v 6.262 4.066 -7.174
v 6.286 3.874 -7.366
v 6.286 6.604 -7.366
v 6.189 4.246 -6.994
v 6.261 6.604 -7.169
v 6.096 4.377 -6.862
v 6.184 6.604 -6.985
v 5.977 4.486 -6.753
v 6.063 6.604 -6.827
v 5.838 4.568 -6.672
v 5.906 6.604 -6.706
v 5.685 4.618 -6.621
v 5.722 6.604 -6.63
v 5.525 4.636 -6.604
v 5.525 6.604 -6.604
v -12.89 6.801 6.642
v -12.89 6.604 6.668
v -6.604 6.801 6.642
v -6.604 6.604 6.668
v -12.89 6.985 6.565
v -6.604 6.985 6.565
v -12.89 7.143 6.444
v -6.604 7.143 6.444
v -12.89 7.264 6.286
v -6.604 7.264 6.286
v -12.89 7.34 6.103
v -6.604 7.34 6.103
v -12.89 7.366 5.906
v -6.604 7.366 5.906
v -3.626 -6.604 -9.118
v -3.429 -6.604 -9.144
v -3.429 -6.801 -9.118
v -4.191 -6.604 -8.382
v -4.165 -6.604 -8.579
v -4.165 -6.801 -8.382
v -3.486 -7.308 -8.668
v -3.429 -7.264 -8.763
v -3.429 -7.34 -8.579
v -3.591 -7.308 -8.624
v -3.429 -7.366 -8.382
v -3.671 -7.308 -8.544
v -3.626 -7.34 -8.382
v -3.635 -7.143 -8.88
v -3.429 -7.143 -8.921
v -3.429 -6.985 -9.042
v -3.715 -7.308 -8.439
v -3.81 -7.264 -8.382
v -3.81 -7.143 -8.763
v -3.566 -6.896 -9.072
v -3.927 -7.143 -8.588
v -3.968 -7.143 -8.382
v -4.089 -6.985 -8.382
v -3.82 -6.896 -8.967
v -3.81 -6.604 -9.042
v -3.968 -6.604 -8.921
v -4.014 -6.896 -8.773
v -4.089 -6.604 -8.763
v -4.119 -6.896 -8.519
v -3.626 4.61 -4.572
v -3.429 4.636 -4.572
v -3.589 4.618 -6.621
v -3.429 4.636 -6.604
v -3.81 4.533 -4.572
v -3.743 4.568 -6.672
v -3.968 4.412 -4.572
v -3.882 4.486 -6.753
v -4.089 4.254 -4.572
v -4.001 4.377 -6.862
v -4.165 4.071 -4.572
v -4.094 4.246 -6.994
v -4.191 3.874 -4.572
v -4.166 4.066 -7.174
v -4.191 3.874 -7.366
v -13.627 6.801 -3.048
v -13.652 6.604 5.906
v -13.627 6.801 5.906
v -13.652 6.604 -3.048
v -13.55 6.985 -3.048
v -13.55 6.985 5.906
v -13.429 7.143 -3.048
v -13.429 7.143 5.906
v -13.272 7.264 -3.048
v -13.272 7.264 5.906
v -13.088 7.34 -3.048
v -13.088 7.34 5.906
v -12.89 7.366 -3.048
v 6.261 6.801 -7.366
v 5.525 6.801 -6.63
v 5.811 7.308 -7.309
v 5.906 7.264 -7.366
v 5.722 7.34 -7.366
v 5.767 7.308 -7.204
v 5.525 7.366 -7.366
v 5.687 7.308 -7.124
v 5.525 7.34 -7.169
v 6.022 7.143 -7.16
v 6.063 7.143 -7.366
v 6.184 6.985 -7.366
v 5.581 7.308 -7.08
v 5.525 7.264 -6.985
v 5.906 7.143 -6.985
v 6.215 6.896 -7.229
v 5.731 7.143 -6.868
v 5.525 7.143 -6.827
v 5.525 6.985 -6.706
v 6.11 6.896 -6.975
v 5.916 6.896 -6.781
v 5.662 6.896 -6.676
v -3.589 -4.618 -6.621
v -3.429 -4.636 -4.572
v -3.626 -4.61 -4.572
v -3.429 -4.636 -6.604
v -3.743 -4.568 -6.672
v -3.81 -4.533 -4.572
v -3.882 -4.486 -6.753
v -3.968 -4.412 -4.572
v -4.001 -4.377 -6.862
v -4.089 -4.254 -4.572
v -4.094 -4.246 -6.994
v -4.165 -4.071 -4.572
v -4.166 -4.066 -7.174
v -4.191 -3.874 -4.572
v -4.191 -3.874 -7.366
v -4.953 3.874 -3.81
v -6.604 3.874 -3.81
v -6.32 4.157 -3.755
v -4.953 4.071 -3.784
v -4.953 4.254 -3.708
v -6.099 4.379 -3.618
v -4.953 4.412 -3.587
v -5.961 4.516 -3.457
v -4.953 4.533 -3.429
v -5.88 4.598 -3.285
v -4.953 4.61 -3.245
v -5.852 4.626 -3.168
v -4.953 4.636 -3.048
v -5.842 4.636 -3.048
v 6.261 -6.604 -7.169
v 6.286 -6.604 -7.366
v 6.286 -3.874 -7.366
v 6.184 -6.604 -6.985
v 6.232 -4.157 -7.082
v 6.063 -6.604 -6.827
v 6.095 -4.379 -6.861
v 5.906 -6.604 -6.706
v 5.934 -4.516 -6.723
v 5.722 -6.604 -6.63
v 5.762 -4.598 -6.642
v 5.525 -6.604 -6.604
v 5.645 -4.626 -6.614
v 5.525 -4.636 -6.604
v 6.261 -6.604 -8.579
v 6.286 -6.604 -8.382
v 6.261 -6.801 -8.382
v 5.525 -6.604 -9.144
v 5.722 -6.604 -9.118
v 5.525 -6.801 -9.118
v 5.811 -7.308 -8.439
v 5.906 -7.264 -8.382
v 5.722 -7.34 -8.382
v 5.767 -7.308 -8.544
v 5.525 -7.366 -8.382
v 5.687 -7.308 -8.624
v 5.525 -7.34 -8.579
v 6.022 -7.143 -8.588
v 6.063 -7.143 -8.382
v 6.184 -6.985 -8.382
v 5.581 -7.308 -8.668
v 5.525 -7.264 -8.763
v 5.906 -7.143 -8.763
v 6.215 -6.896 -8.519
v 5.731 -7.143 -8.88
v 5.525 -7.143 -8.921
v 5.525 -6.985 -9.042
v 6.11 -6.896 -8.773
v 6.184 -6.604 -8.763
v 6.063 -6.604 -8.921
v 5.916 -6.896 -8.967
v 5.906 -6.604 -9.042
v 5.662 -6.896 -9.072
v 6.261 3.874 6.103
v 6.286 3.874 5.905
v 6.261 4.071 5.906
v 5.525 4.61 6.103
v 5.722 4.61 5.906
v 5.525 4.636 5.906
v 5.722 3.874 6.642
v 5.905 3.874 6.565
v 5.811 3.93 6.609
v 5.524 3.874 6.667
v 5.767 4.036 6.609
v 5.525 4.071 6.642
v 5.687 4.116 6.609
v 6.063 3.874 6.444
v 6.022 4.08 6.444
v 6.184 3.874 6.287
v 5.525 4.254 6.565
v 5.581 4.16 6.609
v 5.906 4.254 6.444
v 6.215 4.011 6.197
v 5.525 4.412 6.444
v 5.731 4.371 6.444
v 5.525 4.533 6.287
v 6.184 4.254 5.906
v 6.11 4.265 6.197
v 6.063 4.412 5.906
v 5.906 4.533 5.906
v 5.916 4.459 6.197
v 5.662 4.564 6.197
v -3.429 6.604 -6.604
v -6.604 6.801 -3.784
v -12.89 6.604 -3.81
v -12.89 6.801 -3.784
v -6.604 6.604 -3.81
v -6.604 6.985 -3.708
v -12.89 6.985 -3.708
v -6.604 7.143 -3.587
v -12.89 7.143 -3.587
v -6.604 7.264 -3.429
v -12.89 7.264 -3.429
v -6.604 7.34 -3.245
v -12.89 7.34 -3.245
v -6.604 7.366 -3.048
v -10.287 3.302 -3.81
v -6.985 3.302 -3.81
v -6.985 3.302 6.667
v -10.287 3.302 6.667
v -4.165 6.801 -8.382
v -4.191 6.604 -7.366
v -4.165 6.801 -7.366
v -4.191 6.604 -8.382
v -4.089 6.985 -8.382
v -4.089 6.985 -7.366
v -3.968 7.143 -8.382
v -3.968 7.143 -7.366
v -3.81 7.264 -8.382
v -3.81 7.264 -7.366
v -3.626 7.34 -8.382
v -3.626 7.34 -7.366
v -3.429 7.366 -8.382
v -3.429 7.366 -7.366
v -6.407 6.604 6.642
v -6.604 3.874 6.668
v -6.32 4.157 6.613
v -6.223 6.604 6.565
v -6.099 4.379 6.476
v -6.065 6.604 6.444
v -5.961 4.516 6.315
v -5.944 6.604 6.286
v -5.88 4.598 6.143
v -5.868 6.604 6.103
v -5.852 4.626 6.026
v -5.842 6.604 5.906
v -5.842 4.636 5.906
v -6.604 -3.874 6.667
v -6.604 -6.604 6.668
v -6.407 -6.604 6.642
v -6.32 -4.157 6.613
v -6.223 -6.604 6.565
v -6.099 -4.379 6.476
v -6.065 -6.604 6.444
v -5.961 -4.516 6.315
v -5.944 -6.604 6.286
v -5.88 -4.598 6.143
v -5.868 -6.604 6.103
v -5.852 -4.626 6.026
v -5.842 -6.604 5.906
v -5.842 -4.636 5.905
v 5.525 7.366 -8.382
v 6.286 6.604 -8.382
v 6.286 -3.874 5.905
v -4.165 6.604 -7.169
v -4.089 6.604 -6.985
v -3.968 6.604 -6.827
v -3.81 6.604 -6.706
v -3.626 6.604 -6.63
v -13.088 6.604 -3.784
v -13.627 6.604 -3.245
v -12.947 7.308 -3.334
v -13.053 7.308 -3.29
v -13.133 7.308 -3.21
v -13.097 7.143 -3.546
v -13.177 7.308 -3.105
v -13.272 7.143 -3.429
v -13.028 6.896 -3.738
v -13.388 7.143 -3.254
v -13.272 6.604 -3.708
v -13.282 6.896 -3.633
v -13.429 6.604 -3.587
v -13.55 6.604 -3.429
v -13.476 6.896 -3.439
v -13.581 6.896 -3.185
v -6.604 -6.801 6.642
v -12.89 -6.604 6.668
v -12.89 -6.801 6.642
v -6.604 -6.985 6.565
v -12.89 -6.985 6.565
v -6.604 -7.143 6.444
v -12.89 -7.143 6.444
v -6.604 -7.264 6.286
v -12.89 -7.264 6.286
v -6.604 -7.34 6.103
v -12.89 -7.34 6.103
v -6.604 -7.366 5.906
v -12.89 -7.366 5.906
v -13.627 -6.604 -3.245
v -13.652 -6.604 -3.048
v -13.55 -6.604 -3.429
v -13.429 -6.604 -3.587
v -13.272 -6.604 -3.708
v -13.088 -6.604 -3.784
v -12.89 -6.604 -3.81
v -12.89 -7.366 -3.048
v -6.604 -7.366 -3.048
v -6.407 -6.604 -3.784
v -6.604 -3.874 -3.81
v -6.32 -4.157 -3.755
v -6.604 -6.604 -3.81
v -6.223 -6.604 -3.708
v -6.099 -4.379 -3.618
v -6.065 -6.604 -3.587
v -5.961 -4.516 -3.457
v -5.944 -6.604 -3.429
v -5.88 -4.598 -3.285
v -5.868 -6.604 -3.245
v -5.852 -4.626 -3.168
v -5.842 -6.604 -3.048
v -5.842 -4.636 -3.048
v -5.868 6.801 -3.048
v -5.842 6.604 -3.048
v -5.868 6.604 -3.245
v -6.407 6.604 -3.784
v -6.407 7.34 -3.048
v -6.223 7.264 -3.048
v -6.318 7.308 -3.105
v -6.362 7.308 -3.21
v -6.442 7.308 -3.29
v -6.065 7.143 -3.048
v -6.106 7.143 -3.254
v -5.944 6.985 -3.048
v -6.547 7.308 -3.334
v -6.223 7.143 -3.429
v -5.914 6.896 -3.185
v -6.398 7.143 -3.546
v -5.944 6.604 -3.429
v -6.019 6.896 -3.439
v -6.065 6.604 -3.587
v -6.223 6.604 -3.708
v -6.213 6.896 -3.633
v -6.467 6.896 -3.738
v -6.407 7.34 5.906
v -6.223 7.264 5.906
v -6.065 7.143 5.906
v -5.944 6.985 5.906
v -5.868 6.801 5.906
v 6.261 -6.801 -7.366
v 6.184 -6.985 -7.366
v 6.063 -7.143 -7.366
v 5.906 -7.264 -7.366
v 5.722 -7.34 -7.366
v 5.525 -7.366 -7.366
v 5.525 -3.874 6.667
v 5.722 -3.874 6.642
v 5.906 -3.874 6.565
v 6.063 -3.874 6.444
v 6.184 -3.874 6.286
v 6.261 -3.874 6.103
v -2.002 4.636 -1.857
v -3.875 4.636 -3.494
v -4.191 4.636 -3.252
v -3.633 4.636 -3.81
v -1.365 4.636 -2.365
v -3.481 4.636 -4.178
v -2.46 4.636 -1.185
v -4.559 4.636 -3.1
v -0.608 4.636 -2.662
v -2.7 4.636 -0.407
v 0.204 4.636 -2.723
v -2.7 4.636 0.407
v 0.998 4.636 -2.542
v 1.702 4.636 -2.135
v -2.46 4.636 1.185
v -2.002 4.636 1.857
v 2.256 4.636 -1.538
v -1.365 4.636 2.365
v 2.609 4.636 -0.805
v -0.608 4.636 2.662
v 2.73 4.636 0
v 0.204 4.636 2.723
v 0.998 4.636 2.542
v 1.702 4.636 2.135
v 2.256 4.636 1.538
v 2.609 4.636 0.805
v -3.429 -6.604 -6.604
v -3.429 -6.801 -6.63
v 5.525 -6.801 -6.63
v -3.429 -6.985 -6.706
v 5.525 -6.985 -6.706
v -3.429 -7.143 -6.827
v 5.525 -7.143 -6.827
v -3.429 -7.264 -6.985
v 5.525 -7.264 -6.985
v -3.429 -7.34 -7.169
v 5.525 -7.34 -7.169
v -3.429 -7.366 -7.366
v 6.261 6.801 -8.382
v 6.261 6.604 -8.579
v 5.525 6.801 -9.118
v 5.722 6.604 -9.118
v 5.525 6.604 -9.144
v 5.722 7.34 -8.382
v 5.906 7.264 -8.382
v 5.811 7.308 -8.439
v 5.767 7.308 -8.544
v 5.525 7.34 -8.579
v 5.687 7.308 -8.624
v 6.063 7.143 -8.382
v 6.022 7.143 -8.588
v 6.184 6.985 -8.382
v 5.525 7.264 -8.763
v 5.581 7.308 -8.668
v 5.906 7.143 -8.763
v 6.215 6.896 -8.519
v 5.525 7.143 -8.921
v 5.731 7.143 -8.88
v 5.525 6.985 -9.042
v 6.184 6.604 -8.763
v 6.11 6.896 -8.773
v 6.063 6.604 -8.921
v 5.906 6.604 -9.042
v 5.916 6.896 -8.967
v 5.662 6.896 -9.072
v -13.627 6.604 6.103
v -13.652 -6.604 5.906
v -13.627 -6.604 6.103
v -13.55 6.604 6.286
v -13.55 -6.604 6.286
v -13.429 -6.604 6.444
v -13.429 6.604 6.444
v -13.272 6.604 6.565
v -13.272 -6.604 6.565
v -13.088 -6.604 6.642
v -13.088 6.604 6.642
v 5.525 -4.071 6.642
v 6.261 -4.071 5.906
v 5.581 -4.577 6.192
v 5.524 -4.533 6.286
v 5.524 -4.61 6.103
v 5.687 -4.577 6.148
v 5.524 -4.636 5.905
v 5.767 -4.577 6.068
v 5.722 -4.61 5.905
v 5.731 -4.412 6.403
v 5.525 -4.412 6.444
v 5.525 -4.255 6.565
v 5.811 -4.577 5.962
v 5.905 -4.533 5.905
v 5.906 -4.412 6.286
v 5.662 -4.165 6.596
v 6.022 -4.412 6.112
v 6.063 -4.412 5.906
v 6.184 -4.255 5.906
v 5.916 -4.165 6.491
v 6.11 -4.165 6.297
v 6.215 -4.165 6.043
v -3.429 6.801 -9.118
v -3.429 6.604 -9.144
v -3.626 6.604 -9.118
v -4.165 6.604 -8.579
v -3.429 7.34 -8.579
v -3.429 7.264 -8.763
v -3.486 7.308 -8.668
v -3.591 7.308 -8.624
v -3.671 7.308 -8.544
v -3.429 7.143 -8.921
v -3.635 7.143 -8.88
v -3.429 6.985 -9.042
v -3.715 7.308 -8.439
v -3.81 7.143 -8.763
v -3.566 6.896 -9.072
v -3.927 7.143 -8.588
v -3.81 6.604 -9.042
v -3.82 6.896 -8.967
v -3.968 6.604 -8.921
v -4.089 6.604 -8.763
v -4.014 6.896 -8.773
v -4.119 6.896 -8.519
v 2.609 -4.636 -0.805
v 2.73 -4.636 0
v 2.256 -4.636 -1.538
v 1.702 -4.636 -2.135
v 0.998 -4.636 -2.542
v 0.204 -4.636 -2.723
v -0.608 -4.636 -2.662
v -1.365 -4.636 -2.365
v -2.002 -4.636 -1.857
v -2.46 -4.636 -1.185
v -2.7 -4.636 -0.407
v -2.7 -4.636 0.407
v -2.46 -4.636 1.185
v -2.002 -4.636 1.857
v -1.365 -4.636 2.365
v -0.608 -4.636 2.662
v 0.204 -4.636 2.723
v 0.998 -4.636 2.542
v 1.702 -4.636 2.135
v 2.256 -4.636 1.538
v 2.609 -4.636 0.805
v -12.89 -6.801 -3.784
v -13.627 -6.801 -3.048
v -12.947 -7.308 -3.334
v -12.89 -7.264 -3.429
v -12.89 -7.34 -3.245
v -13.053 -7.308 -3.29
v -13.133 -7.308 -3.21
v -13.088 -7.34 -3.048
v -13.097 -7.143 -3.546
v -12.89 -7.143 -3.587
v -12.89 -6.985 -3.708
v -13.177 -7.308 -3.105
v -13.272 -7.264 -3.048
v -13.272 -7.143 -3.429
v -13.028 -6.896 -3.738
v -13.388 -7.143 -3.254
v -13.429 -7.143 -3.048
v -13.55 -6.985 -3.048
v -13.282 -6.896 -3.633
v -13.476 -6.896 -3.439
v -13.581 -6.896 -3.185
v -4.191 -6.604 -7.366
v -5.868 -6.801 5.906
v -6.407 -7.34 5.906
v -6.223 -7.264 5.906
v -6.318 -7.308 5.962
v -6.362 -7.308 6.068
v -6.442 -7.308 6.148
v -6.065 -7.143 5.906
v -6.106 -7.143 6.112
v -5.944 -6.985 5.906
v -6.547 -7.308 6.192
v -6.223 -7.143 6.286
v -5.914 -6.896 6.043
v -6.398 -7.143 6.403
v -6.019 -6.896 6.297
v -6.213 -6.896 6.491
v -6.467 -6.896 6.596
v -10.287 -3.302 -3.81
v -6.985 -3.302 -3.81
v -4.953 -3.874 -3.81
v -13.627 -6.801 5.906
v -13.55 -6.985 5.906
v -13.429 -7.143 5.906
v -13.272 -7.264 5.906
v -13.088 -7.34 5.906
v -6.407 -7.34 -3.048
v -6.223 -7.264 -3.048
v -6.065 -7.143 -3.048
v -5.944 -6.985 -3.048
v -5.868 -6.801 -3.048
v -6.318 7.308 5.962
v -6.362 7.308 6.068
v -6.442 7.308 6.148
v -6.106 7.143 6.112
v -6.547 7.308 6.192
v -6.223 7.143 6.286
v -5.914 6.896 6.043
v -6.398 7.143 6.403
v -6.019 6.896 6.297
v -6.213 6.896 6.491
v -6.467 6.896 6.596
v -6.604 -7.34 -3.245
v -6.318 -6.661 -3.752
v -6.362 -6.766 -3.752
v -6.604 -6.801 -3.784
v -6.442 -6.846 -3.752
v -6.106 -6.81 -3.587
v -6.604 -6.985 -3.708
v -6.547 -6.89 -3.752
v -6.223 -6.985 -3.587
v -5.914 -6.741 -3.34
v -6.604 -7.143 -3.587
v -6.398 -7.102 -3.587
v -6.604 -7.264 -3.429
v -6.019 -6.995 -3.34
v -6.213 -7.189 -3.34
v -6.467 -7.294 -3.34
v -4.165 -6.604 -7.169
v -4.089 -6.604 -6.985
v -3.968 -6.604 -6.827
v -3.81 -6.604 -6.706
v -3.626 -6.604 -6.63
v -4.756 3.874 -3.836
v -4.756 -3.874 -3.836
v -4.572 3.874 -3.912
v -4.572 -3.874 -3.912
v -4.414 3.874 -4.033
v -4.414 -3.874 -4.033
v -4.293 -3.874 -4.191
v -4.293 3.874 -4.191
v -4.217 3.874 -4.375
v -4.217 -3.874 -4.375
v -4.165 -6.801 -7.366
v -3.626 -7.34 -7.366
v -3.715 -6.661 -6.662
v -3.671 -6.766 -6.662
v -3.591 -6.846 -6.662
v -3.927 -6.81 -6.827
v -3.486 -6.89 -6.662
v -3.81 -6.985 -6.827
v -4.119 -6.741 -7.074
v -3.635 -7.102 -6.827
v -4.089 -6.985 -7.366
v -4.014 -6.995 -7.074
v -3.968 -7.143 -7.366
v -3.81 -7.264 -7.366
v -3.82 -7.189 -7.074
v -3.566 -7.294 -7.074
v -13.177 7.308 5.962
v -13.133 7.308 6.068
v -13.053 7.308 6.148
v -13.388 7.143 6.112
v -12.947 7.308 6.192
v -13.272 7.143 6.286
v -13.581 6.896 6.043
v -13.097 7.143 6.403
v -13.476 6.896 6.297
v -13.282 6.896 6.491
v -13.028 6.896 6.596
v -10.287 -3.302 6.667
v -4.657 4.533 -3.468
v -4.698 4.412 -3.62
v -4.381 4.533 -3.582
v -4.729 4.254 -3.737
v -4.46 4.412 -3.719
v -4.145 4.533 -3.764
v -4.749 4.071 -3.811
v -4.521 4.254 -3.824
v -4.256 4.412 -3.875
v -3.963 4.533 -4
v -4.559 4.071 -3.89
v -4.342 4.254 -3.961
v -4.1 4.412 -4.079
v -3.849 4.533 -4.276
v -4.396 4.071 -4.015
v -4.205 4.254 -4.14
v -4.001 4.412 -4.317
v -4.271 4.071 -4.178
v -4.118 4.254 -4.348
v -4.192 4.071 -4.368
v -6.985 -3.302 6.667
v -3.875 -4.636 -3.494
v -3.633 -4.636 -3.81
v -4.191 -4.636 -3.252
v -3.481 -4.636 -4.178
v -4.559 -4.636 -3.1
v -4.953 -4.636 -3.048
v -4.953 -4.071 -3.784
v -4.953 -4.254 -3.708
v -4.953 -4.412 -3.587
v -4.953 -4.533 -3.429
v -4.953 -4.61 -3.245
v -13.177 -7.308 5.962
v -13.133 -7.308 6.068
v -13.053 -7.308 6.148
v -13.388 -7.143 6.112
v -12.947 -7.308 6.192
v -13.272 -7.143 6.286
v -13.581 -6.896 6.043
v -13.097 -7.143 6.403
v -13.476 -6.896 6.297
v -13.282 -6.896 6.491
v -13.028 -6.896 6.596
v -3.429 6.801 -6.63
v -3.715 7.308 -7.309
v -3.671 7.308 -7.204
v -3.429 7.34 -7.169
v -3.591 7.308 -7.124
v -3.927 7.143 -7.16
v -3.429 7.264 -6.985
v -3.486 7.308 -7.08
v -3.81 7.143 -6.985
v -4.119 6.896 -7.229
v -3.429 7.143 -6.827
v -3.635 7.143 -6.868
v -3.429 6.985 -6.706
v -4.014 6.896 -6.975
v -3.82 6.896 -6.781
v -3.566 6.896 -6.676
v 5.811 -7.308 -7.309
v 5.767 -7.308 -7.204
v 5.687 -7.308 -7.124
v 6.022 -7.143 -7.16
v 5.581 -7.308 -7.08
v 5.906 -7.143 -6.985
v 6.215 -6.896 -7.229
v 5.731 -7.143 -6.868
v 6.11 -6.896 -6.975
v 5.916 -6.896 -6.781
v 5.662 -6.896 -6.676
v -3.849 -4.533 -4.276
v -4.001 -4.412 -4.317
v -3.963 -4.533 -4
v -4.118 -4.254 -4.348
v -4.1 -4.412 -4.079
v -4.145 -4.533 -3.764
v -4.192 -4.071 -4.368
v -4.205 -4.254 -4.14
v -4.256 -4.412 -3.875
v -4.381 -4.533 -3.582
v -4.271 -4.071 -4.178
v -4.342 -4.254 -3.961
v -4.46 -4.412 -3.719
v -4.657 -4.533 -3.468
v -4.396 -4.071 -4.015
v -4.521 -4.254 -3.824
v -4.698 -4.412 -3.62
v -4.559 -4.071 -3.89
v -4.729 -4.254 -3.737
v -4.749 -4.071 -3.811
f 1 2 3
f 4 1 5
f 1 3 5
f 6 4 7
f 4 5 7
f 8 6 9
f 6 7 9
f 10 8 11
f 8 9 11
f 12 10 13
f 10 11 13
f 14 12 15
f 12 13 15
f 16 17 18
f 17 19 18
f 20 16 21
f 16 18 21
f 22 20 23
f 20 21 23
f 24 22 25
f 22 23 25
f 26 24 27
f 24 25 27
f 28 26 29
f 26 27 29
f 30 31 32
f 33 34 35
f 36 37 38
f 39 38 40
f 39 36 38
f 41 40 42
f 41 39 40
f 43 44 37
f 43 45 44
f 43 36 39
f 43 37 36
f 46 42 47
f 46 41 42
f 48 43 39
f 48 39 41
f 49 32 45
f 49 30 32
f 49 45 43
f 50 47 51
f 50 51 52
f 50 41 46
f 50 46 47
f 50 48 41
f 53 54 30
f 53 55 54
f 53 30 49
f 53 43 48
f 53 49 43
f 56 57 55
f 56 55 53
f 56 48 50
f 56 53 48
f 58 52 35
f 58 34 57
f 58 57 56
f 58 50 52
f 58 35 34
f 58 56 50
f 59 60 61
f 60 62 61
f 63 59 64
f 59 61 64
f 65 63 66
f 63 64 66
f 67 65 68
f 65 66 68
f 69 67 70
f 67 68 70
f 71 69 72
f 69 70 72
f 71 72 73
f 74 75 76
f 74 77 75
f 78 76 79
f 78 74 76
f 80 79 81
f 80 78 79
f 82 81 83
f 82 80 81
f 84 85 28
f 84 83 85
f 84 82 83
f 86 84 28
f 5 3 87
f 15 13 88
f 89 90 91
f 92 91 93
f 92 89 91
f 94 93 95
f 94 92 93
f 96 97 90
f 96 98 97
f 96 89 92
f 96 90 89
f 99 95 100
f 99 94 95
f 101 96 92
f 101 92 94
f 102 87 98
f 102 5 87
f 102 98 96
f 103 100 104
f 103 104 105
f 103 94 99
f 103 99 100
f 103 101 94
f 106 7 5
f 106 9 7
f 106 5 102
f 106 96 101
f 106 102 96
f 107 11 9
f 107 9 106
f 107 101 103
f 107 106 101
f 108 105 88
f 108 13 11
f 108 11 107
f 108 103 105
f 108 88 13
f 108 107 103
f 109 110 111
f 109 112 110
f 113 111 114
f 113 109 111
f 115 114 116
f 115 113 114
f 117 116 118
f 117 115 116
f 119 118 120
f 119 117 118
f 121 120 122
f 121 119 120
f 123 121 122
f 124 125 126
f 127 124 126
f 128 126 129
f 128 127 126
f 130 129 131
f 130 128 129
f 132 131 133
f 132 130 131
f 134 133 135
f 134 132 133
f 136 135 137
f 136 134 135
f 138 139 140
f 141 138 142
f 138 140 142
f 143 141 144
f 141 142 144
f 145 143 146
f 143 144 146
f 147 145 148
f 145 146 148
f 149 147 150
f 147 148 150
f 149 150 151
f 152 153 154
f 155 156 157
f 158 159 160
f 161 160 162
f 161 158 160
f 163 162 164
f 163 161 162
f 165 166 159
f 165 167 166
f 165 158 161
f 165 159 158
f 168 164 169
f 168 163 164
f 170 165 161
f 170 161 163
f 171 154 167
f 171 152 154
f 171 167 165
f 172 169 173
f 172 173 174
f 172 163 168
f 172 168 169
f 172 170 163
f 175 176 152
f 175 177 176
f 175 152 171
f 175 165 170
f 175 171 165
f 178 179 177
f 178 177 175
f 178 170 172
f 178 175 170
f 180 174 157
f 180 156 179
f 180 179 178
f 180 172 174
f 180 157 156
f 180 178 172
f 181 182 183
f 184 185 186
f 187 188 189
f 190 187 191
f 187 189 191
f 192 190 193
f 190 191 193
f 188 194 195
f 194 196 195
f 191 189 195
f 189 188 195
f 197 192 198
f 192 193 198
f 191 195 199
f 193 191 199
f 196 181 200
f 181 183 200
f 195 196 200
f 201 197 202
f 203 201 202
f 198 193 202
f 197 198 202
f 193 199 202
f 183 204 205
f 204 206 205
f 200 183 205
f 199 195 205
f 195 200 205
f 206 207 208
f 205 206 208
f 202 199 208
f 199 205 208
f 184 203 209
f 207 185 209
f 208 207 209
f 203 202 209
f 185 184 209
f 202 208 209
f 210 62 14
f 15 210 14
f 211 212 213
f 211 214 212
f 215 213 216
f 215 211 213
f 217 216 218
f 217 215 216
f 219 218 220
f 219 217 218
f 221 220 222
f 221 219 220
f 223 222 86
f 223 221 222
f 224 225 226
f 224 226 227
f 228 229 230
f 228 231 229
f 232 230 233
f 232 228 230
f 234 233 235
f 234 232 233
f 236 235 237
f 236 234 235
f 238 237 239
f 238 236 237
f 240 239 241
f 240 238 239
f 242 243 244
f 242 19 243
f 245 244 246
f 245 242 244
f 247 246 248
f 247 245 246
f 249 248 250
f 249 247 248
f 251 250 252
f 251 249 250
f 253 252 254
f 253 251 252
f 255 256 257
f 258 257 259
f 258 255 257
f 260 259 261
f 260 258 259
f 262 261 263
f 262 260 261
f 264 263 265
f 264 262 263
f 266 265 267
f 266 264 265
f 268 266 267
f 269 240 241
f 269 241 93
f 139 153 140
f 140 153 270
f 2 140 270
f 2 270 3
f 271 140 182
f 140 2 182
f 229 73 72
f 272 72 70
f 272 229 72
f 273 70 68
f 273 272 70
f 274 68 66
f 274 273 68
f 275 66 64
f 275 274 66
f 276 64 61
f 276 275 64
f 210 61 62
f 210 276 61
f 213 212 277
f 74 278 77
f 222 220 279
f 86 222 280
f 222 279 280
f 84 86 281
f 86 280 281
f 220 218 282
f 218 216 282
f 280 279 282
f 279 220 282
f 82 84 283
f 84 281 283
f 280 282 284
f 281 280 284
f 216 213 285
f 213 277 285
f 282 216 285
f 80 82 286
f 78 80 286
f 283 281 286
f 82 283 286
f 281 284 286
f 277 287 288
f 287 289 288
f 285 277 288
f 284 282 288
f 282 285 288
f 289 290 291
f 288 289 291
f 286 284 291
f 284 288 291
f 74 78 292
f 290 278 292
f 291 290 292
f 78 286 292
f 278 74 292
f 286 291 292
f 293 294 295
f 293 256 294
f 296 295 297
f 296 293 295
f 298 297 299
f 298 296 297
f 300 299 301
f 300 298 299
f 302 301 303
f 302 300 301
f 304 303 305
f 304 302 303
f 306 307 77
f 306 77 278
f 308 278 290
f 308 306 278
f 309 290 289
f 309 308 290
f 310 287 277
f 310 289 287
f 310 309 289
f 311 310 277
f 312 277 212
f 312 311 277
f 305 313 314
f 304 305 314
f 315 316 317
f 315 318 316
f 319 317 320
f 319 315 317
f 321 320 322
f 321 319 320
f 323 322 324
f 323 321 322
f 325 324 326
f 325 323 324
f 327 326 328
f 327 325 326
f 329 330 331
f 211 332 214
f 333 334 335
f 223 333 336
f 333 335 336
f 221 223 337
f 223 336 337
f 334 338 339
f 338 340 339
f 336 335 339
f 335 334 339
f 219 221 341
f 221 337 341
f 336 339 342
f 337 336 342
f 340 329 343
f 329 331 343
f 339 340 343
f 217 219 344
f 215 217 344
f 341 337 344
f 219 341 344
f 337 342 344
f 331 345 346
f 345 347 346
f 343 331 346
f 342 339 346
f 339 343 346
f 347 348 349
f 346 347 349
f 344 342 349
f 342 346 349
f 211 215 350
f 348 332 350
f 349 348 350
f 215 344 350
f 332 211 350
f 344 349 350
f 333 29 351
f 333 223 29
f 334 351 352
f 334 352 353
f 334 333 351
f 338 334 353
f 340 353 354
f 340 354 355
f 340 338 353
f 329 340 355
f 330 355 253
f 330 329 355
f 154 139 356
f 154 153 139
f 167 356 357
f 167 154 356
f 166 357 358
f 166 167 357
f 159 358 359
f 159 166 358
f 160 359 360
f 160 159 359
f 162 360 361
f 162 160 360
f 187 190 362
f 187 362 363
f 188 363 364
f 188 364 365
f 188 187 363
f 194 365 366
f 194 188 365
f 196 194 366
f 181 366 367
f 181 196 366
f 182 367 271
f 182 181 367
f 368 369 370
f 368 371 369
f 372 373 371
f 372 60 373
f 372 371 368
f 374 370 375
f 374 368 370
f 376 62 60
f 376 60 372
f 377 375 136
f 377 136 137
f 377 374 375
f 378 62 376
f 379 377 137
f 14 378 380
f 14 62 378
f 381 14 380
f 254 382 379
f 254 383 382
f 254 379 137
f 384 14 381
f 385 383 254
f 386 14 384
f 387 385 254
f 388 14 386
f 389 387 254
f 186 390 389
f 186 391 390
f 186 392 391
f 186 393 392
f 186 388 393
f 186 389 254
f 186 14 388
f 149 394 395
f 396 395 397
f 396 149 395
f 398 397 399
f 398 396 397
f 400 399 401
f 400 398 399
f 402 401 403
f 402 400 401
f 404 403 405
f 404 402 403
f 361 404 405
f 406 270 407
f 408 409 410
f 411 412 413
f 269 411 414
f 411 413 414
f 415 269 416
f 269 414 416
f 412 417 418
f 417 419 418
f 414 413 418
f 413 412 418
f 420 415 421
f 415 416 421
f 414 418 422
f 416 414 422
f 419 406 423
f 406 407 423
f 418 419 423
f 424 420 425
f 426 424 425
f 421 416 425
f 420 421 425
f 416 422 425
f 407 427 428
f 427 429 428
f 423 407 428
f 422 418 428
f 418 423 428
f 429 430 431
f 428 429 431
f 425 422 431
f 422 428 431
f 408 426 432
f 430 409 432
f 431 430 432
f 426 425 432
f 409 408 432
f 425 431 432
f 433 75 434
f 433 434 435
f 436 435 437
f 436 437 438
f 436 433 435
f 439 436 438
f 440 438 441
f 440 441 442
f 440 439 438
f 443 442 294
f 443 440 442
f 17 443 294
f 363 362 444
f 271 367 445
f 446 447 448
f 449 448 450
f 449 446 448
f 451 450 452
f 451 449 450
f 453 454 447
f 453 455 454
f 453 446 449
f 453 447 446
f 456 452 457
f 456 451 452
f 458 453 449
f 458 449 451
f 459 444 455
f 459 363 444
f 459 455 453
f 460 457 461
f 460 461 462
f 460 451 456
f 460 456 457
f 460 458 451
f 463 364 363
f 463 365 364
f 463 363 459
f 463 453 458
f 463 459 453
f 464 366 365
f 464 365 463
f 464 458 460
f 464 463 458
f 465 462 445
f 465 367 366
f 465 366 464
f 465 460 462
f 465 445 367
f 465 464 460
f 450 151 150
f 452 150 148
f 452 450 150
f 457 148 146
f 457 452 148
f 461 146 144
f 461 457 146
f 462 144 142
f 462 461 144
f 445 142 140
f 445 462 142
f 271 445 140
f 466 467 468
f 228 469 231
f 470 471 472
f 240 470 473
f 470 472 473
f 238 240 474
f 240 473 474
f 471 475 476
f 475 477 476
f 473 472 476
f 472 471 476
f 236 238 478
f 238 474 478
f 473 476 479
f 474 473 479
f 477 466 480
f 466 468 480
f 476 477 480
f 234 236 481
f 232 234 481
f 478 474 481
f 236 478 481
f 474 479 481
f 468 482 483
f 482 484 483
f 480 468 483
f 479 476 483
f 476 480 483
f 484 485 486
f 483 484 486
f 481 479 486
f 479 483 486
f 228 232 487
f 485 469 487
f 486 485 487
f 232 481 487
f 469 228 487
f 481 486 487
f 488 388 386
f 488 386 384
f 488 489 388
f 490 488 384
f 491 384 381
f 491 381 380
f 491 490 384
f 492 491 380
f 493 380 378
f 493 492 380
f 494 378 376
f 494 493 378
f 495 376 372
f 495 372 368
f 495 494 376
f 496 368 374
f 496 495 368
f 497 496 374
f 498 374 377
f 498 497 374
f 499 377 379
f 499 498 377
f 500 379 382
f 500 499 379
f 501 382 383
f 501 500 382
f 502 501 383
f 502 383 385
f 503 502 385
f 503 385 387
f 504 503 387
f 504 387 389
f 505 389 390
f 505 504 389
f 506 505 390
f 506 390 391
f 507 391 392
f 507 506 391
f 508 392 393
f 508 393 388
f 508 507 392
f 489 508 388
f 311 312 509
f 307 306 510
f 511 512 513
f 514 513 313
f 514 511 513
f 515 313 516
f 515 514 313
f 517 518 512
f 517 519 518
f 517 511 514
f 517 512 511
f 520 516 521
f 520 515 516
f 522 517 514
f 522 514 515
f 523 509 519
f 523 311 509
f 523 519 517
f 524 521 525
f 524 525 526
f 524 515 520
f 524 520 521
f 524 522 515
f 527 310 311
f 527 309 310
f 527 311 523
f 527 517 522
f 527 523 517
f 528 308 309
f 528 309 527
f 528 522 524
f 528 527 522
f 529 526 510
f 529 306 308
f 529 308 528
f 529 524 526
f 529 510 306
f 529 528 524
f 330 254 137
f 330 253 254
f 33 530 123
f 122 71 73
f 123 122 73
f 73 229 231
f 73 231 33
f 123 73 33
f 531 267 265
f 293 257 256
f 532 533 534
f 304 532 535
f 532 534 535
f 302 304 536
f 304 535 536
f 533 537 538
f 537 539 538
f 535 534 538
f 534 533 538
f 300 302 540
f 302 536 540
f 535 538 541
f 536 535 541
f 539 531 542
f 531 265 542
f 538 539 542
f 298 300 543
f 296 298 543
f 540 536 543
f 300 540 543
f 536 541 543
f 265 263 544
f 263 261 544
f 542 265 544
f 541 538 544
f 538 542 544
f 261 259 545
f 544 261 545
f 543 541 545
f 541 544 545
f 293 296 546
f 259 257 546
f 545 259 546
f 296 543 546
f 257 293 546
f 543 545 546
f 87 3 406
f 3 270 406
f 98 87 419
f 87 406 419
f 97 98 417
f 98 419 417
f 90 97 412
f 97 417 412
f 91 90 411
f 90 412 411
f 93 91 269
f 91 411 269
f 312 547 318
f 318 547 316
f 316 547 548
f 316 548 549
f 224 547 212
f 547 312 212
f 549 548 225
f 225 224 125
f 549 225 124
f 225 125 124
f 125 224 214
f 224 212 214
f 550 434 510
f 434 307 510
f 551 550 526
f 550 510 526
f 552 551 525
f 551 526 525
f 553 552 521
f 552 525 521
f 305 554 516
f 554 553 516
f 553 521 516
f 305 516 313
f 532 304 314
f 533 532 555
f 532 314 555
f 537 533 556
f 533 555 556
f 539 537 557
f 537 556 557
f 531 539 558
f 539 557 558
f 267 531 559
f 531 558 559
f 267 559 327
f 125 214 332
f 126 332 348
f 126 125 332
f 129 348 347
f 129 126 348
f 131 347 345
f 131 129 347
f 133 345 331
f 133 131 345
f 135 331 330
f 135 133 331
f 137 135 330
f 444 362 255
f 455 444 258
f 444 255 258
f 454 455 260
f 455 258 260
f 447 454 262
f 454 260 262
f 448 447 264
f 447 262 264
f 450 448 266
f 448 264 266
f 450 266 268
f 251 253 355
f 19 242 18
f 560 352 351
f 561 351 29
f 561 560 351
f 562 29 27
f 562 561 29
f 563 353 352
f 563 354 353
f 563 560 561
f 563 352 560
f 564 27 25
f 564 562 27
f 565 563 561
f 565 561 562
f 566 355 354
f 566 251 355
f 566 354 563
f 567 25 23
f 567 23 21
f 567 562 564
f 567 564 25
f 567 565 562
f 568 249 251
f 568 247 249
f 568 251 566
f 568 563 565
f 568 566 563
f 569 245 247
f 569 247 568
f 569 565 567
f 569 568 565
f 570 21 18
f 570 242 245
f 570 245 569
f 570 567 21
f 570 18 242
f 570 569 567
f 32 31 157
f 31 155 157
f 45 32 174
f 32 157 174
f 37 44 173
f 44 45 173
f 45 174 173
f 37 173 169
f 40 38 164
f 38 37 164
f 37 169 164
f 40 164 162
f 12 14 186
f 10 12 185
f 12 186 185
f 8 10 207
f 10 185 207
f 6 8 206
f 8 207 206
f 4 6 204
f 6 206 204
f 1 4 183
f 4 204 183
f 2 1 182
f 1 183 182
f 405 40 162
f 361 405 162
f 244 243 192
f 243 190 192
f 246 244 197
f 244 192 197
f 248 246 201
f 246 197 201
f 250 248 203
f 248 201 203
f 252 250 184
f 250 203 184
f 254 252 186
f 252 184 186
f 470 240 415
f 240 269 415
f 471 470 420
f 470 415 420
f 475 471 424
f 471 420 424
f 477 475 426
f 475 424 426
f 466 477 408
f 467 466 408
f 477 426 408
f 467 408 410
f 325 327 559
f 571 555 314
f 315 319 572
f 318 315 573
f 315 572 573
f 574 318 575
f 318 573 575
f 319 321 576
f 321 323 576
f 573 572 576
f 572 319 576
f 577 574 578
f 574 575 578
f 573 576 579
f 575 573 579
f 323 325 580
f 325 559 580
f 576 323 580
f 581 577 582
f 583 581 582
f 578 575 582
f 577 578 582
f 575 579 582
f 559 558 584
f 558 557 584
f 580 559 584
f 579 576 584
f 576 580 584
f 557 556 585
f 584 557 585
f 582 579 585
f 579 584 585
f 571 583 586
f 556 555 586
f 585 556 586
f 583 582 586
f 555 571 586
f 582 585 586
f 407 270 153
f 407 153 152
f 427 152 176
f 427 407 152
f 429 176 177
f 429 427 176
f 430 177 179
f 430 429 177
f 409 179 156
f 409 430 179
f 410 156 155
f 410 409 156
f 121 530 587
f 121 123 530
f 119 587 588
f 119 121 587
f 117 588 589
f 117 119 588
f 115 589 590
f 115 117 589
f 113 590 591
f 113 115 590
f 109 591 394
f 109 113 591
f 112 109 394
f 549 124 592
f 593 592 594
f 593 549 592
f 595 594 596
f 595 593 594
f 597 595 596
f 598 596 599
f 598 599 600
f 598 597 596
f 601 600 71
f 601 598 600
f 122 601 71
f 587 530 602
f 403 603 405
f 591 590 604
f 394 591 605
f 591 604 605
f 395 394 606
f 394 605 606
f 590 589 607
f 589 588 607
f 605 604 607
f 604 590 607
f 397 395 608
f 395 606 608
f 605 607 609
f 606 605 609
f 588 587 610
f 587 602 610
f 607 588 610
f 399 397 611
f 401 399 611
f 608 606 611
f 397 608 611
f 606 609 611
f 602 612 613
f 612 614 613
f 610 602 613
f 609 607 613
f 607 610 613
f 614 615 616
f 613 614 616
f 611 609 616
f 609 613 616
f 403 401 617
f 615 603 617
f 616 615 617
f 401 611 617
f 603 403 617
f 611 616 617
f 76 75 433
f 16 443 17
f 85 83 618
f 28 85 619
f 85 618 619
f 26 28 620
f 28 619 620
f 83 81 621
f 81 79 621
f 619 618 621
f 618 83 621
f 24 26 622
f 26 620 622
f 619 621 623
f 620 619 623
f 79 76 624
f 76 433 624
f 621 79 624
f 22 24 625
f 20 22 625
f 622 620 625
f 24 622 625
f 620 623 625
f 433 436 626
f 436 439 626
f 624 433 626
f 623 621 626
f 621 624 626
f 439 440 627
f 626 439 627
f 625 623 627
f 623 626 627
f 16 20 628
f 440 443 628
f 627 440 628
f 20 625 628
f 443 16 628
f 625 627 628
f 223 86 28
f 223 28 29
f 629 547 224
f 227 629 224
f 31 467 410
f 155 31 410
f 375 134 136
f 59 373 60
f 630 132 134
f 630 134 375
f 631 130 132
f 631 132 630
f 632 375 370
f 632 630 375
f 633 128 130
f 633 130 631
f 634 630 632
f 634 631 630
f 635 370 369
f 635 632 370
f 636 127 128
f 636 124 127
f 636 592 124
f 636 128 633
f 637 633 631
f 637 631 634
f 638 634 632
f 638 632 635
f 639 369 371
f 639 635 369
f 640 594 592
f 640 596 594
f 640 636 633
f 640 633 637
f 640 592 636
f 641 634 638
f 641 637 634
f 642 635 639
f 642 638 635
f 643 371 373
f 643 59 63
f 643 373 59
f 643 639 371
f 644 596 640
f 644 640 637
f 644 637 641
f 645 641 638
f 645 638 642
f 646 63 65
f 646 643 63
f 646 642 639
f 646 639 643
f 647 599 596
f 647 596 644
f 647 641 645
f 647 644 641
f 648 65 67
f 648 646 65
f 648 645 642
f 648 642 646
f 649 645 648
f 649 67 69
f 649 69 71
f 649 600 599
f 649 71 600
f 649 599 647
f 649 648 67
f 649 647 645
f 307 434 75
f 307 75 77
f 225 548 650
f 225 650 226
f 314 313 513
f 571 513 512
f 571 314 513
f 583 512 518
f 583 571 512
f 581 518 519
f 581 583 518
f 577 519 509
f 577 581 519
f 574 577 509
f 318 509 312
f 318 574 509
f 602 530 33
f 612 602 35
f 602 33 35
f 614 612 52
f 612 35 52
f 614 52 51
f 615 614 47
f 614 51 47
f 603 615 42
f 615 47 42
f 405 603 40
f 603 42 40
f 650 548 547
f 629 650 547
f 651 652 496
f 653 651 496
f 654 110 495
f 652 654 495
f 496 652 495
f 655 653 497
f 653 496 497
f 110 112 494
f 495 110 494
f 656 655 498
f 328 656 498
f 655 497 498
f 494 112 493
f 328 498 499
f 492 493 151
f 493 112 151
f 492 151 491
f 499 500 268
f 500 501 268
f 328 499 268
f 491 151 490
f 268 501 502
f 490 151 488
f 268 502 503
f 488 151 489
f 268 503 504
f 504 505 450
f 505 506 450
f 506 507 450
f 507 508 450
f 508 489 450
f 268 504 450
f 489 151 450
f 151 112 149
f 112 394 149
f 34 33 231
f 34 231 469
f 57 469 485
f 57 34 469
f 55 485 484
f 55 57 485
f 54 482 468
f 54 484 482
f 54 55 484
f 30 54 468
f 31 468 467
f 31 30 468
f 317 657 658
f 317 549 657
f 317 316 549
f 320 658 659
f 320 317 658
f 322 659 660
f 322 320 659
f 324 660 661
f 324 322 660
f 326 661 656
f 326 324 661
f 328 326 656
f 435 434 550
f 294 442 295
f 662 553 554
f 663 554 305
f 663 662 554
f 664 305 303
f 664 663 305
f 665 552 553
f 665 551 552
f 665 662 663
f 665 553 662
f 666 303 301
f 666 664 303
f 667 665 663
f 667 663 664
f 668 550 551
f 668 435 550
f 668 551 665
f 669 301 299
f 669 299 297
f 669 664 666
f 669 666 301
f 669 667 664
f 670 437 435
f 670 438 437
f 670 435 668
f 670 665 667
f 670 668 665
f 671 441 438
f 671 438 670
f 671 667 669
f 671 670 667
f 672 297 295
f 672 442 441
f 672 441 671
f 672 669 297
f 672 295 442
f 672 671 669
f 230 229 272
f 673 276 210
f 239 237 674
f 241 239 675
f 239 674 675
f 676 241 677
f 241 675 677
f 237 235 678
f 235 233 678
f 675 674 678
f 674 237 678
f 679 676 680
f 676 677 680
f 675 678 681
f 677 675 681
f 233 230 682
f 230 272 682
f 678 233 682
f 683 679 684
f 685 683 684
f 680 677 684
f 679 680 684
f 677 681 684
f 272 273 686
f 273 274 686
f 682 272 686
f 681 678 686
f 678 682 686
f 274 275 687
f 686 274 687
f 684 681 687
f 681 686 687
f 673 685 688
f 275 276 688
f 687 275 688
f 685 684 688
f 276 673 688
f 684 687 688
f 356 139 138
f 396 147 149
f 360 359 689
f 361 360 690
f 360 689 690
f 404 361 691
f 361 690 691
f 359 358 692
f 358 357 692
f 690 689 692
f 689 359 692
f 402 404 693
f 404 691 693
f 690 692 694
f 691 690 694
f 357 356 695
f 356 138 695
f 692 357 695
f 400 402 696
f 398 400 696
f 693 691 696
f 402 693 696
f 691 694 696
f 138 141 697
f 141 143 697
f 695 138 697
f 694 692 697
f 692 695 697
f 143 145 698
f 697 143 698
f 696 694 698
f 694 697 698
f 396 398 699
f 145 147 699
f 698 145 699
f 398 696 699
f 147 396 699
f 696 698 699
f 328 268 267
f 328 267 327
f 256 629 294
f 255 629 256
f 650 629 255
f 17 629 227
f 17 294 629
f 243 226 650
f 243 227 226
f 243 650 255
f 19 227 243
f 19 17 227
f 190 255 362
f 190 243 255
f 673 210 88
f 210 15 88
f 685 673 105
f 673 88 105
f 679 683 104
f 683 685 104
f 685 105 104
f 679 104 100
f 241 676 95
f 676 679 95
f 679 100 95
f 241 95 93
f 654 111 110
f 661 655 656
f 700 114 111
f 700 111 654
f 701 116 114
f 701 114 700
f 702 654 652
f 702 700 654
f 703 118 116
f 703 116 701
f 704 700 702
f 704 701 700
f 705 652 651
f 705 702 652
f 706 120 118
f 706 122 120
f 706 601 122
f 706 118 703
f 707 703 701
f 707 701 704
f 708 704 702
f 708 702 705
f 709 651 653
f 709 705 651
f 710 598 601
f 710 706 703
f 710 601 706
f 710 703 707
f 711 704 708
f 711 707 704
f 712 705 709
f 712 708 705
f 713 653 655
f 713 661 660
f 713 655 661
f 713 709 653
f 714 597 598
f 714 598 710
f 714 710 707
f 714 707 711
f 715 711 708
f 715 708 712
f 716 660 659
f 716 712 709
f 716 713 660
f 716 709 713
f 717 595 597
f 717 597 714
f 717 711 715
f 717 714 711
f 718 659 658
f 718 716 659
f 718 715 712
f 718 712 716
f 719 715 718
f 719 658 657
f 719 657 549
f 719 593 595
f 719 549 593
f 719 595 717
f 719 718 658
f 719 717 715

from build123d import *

# Parameters (mm, degrees)
SKETCH1_R           = 2.7305
BOSS_EXTRUDE1_DEPTH = 4.6355
SKETCH2_W           = 10.4775
SKETCH2_H           = 9.271
BOSS_EXTRUDE2_DEPTH = 2.54
SKETCH3_W           = 10.4775
SKETCH3_H           = 2.54
SKETCH3_W_2         = 7.8105
SKETCH3_H_2         = 10.4775
BOSS_EXTRUDE3_DEPTH = 7.366
SKETCH4_W           = 3.302
SKETCH4_H           = 6.604
CUT_EXTRUDE1_DEPTH  = 10.4775
FILLET1_R           = 0.762


with BuildPart() as part:
    # Sketch1 → Boss-Extrude1 (new body, symmetric)
    with BuildSketch(Plane(origin=(0, 0, 0), x_dir=(1, 0, 0), z_dir=(0, 1, 0))):
        Polygon((-11.1125, 3.81), (-4.191, 3.81), (-4.191, 9.144), (6.2865, 9.144), (6.2865, -6.6675), (-11.1125, -6.6675), align=None)
        Circle(SKETCH1_R, mode=Mode.SUBTRACT)
    extrude(amount=BOSS_EXTRUDE1_DEPTH, both=True)

    # Sketch2 → Boss-Extrude2 (add)
    with BuildSketch(Plane.ZY.offset(11.1125)):
        with Locations((1.42875, 0)):
            Rectangle(SKETCH2_W, SKETCH2_H)
    extrude(amount=BOSS_EXTRUDE2_DEPTH)

    # Sketch3 → Boss-Extrude3 (add, symmetric)
    with BuildSketch(Plane(origin=(0, 0, 0), x_dir=(1, 0, 0), z_dir=(0, 1, 0))):
        with Locations((1.04775, 7.874)):
            Rectangle(SKETCH3_W, SKETCH3_H)
        with Locations((-9.74725, -1.42875)):
            Rectangle(SKETCH3_W_2, SKETCH3_H_2)
    extrude(amount=BOSS_EXTRUDE3_DEPTH, both=True)

    # Sketch4 → Cut-Extrude1 (cut)
    with BuildSketch(Plane(origin=(0, 0, -3.81), x_dir=(-1, 0, 0), z_dir=(0, 0, -1))):
        with Locations((8.636, 0)):
            Rectangle(SKETCH4_W, SKETCH4_H)
    extrude(amount=-CUT_EXTRUDE1_DEPTH, mode=Mode.SUBTRACT)

    # Fillet1
    fillet1_edges = [part.edges().sort_by_distance(p)[0] for p in [
        (6.2865, 4.6355, 0.03175),
        (-4.191, 0, -3.81),
        (-4.191, 0, -9.144),
        (6.2865, 0, -9.144),
        (6.2865, 0, 6.6675),
        (-5.0165, 4.6355, -3.81),
        (-13.6525, 0, -3.81),
        (-13.6525, 0, 6.6675),
        (-4.191, -4.6355, -5.207),
        (-4.191, 4.6355, -5.207),
        (6.2865, 6.00075, -6.604),
        (-4.191, 6.00075, -6.604),
        (6.2865, -6.00075, -6.604),
        (6.2865, -7.366, -7.874),
        (1.04775, -7.366, -9.144),
        (-4.191, -7.366, -7.874),
        (-4.191, -6.00075, -6.604),
        (1.04775, -7.366, -6.604),
        (6.2865, 7.366, -7.874),
        (1.04775, 7.366, -9.144),
        (-4.191, 7.366, -7.874),
        (1.04775, 7.366, -6.604),
        (0.22225, -4.6355, 6.6675),
        (0.22225, 4.6355, 6.6675),
        (-5.842, 6.00075, 6.6675),
        (-5.842, 6.00075, -3.81),
        (-5.842, -6.00075, 6.6675),
        (-5.842, -7.366, 1.42875),
        (-5.842, -6.00075, -3.81),
        (-9.74725, -7.366, -3.81),
        (-13.6525, -7.366, 1.42875),
        (-9.74725, -7.366, 6.6675),
        (-5.0165, -4.6355, -3.81),
        (-5.842, 7.366, 1.42875),
        (-9.74725, 7.366, -3.81),
        (-13.6525, 7.366, 1.42875),
        (-9.74725, 7.366, 6.6675),
        (6.2865, -4.6355, 0.03175),
    ]]
    fillet(fillet1_edges, radius=FILLET1_R)


solid = part.part
